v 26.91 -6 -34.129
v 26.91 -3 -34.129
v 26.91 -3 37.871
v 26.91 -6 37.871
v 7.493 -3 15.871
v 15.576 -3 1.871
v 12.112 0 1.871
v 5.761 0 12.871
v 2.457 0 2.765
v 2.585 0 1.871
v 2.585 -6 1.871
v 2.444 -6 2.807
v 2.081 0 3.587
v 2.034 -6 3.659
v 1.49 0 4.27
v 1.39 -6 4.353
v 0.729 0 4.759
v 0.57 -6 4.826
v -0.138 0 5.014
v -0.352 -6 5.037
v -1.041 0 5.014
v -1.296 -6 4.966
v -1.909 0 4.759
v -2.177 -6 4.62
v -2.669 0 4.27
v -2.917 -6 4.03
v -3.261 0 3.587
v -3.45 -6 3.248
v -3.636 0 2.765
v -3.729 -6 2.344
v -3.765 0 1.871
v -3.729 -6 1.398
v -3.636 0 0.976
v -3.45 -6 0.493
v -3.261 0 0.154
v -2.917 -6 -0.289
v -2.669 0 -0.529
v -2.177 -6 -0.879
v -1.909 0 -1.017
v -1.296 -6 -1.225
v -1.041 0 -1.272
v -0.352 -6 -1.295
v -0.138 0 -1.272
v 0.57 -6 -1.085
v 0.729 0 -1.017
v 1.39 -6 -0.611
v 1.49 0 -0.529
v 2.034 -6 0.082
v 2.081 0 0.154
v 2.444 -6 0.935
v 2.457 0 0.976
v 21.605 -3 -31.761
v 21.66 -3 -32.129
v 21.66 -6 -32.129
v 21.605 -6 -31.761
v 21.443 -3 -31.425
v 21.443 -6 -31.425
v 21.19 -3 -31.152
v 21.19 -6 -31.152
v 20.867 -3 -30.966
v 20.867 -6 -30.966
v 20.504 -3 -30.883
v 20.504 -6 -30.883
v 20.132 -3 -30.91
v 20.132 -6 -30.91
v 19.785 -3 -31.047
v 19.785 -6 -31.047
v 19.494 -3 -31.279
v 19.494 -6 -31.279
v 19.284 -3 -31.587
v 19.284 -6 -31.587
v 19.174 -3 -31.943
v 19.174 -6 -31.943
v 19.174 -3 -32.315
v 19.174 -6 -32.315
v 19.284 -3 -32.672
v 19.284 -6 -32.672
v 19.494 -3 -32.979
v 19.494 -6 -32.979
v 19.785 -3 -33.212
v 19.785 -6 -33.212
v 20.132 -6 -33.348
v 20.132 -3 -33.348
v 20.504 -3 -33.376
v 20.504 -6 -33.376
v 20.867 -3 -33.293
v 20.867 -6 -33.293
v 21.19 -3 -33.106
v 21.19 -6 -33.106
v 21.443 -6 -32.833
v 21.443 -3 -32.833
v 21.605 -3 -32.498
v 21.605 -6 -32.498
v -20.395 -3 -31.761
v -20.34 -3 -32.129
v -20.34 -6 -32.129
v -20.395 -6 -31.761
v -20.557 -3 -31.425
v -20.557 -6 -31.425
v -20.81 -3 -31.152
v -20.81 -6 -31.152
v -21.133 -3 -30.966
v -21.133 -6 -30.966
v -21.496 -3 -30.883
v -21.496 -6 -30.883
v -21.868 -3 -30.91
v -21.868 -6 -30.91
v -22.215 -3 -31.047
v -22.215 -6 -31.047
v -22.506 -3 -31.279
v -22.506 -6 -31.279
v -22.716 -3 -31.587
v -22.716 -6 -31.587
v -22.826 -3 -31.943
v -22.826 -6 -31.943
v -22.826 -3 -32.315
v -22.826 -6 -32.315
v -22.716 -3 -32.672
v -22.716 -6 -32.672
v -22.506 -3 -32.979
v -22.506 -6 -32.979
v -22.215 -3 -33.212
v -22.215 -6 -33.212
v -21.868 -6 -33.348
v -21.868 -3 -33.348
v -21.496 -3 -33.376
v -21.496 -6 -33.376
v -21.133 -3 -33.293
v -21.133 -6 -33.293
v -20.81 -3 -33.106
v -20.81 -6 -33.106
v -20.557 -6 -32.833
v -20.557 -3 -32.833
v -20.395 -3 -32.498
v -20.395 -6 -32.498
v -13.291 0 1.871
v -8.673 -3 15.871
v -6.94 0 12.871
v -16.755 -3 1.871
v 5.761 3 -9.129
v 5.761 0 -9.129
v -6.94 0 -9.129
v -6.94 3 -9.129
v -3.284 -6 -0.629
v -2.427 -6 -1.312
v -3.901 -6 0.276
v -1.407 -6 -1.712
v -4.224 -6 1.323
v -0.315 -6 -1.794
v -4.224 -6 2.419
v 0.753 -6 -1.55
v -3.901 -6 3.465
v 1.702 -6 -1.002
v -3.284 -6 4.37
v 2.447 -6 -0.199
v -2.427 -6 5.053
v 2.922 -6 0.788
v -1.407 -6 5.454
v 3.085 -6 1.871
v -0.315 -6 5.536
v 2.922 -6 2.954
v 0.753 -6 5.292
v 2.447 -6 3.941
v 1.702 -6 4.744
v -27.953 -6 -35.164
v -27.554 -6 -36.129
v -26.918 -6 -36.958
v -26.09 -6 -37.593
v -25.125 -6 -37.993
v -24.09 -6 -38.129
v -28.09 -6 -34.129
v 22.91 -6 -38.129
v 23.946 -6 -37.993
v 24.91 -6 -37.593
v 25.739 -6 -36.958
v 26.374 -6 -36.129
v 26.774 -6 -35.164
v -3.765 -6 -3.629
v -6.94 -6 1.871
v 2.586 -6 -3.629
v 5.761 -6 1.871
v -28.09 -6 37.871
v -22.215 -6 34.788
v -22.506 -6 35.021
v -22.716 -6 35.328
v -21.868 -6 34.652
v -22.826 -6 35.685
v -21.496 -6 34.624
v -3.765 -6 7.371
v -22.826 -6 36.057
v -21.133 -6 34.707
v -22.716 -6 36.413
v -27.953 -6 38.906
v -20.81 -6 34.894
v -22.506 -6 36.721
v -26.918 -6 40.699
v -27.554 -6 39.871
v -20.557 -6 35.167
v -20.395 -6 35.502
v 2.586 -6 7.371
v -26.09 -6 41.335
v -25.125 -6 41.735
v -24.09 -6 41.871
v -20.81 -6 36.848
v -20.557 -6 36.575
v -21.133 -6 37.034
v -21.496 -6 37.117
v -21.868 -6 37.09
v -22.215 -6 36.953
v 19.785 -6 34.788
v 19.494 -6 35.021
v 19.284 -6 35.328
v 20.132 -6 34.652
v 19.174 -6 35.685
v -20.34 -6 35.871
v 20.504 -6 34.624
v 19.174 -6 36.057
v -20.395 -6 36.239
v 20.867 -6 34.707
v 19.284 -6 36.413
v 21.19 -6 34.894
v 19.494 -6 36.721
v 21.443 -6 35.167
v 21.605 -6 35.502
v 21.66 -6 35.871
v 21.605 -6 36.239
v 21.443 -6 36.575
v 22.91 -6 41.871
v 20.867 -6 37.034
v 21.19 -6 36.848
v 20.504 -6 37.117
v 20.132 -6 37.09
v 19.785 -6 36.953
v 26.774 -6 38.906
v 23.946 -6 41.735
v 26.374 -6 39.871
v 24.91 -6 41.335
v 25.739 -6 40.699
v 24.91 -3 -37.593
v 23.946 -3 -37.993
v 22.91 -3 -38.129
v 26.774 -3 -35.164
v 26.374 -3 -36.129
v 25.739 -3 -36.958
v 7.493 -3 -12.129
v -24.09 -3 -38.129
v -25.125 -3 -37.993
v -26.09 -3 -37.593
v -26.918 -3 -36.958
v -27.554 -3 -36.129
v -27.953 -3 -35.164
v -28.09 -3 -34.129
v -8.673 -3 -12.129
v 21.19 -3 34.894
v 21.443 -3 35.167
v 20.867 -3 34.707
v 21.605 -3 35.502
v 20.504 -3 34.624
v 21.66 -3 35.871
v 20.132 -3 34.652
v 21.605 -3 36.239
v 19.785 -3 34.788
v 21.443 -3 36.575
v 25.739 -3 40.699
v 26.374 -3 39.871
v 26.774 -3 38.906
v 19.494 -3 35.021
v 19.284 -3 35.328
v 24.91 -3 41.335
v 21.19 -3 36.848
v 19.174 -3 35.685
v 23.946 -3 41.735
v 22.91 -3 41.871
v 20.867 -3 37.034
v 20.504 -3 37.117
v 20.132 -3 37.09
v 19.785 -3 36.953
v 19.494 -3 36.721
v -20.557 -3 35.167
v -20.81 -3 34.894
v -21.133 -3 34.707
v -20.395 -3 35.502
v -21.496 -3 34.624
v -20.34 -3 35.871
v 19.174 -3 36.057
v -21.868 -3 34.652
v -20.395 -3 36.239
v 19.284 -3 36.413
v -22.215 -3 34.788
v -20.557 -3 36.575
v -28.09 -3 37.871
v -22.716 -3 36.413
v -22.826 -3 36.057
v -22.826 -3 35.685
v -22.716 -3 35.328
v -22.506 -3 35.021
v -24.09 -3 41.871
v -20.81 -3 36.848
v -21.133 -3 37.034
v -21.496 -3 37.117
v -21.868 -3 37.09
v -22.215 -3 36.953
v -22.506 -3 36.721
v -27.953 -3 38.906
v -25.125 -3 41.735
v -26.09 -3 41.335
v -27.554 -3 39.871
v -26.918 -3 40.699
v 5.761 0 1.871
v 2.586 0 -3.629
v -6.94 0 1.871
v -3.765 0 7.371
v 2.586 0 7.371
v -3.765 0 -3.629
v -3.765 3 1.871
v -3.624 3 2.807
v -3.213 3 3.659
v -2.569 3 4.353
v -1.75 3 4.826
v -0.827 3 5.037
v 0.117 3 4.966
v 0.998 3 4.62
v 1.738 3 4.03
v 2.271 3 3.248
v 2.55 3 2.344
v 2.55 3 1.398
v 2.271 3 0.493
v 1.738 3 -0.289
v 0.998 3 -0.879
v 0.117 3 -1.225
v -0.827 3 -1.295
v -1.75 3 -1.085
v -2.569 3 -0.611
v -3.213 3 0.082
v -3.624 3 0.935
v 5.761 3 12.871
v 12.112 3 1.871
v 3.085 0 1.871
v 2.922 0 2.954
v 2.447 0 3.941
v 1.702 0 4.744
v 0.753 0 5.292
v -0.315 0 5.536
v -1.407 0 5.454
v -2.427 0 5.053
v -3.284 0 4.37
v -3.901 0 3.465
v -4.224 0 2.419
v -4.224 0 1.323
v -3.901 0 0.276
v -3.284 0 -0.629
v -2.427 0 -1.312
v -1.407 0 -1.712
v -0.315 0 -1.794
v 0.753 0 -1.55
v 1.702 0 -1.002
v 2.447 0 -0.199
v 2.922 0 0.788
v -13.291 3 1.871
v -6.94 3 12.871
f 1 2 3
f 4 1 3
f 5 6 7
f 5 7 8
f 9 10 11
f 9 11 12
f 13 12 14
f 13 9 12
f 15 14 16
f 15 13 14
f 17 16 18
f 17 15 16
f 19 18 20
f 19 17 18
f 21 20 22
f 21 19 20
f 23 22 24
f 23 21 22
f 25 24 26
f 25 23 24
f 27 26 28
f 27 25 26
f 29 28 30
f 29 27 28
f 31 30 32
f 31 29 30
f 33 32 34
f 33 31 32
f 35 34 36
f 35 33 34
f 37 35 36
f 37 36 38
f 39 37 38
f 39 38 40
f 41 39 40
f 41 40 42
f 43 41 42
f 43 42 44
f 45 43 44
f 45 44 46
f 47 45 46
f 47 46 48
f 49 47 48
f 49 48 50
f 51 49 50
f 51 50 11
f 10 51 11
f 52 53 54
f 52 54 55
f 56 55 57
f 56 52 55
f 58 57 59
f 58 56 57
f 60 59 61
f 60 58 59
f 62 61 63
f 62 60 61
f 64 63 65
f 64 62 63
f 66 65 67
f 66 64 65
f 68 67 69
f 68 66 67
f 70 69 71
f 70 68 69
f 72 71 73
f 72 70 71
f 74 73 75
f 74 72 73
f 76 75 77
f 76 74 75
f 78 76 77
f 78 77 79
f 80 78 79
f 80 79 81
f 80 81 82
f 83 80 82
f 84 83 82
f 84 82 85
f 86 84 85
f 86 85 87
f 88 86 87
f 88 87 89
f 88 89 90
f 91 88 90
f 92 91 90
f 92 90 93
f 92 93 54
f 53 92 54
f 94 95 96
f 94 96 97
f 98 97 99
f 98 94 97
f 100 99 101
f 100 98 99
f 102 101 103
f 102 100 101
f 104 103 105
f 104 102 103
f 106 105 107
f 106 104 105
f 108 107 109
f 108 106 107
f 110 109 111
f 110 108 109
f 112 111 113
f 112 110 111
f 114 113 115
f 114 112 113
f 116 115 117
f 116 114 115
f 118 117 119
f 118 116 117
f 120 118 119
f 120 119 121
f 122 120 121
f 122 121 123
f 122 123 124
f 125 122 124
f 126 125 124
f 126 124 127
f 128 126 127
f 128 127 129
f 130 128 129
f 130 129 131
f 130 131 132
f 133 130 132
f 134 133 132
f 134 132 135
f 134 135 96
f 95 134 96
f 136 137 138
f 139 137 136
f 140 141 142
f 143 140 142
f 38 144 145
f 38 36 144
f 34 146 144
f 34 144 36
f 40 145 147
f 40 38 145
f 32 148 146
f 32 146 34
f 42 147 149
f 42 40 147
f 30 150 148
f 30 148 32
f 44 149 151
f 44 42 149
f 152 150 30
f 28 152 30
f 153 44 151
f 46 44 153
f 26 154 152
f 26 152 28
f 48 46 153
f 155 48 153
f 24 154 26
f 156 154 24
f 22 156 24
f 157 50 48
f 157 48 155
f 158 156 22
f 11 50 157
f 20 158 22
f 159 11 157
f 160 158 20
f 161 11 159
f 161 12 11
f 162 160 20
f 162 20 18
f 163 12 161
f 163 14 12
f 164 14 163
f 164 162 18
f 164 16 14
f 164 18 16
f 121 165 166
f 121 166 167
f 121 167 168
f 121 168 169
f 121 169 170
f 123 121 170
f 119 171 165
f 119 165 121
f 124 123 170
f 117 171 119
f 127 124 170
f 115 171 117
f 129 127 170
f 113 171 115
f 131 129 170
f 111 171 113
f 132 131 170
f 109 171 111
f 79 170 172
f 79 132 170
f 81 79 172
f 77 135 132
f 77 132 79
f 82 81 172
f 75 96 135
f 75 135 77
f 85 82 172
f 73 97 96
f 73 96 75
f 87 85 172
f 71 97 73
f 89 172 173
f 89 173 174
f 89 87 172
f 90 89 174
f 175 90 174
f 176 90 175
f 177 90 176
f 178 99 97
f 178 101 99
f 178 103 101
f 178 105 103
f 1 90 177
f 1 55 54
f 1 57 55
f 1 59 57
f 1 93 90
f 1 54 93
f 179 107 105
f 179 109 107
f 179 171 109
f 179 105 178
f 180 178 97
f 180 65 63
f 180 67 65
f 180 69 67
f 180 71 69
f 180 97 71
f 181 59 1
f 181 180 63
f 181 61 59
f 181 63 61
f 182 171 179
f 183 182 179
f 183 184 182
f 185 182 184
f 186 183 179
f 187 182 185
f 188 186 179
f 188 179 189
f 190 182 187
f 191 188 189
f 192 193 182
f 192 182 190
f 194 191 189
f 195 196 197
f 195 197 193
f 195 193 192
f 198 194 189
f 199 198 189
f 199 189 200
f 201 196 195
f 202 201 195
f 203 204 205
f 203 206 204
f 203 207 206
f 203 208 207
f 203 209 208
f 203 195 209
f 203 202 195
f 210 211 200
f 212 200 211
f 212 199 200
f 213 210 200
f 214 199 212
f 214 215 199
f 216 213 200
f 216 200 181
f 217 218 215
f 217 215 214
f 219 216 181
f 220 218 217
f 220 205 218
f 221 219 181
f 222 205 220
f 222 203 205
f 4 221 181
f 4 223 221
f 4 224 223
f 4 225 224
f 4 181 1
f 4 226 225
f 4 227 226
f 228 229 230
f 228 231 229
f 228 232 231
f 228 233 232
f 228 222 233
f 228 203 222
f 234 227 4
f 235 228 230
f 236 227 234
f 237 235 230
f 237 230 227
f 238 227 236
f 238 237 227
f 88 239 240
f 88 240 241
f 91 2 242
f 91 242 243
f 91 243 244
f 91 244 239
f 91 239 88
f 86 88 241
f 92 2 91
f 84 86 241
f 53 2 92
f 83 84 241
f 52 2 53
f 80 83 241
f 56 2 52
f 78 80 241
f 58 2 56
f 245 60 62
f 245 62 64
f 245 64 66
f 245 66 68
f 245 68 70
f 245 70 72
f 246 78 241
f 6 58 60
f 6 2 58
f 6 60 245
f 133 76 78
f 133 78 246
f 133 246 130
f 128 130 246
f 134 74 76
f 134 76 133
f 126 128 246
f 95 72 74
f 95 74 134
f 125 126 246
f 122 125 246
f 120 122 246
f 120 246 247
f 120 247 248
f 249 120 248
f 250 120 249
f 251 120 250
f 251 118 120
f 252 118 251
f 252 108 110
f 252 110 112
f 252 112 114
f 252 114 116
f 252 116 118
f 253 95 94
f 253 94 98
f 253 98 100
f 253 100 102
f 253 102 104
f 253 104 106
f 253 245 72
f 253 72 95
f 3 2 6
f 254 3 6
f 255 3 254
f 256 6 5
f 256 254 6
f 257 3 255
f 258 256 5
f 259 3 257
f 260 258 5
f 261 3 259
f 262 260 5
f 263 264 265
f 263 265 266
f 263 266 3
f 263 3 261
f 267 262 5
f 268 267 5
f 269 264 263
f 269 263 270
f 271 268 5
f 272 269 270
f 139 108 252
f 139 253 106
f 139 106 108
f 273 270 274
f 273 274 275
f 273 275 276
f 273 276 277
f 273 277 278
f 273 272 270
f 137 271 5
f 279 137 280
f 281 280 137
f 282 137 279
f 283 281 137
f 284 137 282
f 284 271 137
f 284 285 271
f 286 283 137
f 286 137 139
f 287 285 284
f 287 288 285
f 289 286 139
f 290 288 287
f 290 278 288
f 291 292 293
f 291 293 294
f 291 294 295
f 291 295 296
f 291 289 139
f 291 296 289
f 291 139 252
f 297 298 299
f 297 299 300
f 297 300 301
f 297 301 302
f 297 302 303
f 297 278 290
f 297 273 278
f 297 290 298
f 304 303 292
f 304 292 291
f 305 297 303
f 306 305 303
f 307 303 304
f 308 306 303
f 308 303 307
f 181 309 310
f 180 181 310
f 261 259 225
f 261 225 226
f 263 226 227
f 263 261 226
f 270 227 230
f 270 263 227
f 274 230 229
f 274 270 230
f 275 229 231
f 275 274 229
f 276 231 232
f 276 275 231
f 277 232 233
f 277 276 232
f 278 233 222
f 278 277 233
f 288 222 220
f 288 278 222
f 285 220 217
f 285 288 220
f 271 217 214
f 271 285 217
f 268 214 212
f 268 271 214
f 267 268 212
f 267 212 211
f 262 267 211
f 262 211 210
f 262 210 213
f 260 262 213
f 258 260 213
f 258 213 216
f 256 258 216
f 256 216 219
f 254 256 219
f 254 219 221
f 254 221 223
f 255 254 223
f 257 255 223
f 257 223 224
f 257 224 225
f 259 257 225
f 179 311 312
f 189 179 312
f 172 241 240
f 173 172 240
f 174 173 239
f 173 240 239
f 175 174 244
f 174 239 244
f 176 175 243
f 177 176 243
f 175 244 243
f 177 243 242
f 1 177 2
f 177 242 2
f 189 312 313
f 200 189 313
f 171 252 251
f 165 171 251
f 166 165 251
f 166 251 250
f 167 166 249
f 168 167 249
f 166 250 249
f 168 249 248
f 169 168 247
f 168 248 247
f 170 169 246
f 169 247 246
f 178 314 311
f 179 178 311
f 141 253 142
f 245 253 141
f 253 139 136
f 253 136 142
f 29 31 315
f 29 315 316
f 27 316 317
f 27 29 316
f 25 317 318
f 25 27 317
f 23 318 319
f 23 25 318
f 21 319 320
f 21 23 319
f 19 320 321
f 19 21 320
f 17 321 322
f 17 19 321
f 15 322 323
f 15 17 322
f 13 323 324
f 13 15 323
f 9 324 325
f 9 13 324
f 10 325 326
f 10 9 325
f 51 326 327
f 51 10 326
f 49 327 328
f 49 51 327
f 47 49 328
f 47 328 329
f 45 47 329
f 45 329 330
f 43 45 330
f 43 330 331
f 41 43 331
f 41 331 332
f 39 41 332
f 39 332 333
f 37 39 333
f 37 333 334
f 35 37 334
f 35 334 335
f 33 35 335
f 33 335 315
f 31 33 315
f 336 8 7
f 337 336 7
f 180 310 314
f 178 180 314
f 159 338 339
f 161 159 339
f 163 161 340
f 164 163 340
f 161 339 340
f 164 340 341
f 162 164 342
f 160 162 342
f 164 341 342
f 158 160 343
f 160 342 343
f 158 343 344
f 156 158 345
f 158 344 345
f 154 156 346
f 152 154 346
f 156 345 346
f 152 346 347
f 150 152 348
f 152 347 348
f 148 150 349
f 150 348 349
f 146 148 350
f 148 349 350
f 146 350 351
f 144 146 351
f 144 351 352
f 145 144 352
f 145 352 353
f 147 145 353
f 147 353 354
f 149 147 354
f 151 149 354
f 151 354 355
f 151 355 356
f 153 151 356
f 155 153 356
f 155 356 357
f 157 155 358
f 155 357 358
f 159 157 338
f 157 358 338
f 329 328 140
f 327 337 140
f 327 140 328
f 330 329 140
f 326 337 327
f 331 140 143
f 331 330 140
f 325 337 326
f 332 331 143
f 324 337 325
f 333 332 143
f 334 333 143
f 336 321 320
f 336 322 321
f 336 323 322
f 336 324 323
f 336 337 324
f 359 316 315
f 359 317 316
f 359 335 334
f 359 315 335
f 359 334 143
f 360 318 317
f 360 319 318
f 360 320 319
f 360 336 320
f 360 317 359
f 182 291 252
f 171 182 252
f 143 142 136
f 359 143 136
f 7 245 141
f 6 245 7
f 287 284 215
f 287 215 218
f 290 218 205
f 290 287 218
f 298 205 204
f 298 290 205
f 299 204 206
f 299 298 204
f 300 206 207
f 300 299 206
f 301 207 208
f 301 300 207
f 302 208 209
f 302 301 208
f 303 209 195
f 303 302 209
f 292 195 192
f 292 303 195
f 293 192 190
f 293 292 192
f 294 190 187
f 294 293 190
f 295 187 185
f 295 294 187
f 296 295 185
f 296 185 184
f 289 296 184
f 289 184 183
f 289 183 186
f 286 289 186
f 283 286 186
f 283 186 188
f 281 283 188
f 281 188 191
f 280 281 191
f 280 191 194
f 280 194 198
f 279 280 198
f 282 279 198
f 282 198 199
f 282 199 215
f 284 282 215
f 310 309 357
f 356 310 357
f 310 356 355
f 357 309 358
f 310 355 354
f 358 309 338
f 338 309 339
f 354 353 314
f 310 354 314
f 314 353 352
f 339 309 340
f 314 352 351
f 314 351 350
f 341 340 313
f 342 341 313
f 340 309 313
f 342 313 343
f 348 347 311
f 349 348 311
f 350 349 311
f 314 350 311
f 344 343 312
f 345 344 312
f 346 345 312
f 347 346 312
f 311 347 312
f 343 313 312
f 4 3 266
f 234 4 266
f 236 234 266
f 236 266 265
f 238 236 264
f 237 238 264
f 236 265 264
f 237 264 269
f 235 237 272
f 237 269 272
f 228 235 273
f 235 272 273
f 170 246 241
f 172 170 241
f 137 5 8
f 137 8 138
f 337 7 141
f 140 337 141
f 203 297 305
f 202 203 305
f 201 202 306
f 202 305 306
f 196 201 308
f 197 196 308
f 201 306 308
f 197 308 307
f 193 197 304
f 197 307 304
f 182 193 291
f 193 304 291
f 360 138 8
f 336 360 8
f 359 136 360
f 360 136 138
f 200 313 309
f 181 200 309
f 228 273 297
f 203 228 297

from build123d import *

# Parameters (mm, degrees)
F0_R     = 1.25
F1_DEPTH = 6
F2_R     = 1.25
F3_DEPTH = 3
F4_SIZE  = 2.99999
F5_R     = 3.175
F6_DEPTH = 3
F7_R     = 3.675
F7_R_2   = 3.175
F8_DEPTH = 6


# Not quite as in the source:
# - a fillet or chamfer is up to 0.001 mm smaller than in the source, because OpenCascade refuses the exact size


with BuildPart() as f1:
    # F0 (on Front) → F1 (new body)
    with BuildSketch(Plane.XZ):
        with BuildLine():
            Line((22.9103805721, 41.8708454072), (-24.0896194279, 41.8708454072))
            ThreePointArc((-24.0896194279, 41.8708454072), (-26.9180465527, 40.699272532), (-28.0896194279, 37.8708454072))
            Line((-28.0896194279, 37.8708454072), (-28.0896194279, -34.1291545928))
            ThreePointArc((-28.0896194279, -34.1291545928), (-26.9180465527, -36.9575817175), (-24.0896194279, -38.1291545928))
            Line((-24.0896194279, -38.1291545928), (22.9103805721, -38.1291545928))
            ThreePointArc((22.9103805721, -38.1291545928), (25.7388076968, -36.9575817175), (26.9103805721, -34.1291545928))
            Line((26.9103805721, -34.1291545928), (26.9103805721, 37.8708454072))
            ThreePointArc((26.9103805721, 37.8708454072), (25.7388076968, 40.699272532), (22.9103805721, 41.8708454072))
        make_face()
        with Locations((-21.5896194279, -32.1291545928)):
            Circle(F0_R, mode=Mode.SUBTRACT)
        with Locations((20.4103805721, -32.1291545928)):
            Circle(F0_R, mode=Mode.SUBTRACT)
        Polygon((5.7612335332, 1.8708454072), (2.5858070526, -3.6291545928), (-3.7650459085, -3.6291545928), (-6.940472389, 1.8708454072), (-3.7650459085, 7.3708454072), (2.5858070526, 7.3708454072), align=None, mode=Mode.SUBTRACT)
        with Locations((-21.5896194279, 35.8708454072)):
            Circle(F0_R, mode=Mode.SUBTRACT)
        with Locations((20.4103805721, 35.8708454072)):
            Circle(F0_R, mode=Mode.SUBTRACT)
    extrude(amount=F1_DEPTH)

    # F2 (on face) → F3 (cut)
    with BuildSketch(Plane(origin=(0, 0, 0), x_dir=(-1, 0, 0), z_dir=(0, 1, 0))):
        with BuildLine():
            ThreePointArc((28.0896194279, 37.8708454072), (26.9180465527, 40.699272532), (24.0896194279, 41.8708454072))
            Line((24.0896194279, 41.8708454072), (-22.9103805721, 41.8708454072))
            ThreePointArc((-22.9103805721, 41.8708454072), (-25.7388076968, 40.699272532), (-26.9103805721, 37.8708454072))
            Line((-26.9103805721, 37.8708454072), (-26.9103805721, -34.1291545928))
            ThreePointArc((-26.9103805721, -34.1291545928), (-25.7388076968, -36.9575817175), (-22.9103805721, -38.1291545928))
            Line((-22.9103805721, -38.1291545928), (24.0896194279, -38.1291545928))
            ThreePointArc((24.0896194279, -38.1291545928), (26.9180465527, -36.9575817175), (28.0896194279, -34.1291545928))
            Line((28.0896194279, -34.1291545928), (28.0896194279, 37.8708454072))
        make_face()
        with Locations((-20.4103805721, -32.1291545928)):
            Circle(F2_R, mode=Mode.SUBTRACT)
        with Locations((21.5896194279, -32.1291545928)):
            Circle(F2_R, mode=Mode.SUBTRACT)
        Polygon((13.2913253501, 1.8708454072), (6.940472389, -9.1291545928), (-5.7612335332, -9.1291545928), (-12.1120864943, 1.8708454072), (-5.7612335332, 12.8708454072), (6.940472389, 12.8708454072), align=None, mode=Mode.SUBTRACT)
        with Locations((-20.4103805721, 35.8708454072)):
            Circle(F2_R, mode=Mode.SUBTRACT)
        with Locations((21.5896194279, 35.8708454072)):
            Circle(F2_R, mode=Mode.SUBTRACT)
    extrude(amount=-F3_DEPTH, mode=Mode.SUBTRACT)

    # F4 (size 3 in the source; OpenCascade refuses exactly that, so slightly less here)
    f4_edges = [f1.edges().sort_by_distance(p)[0] for p in [
        (8.93666, -3, 7.370845),
        (8.93666, -3, -3.629155),
        (-0.589619, -3, -9.129155),
        (-10.115899, -3, -3.629155),
        (-10.115899, -3, 7.370845),
        (-0.589619, -3, 12.870845),
    ]]
    chamfer(f4_edges, length=F4_SIZE)

    # F5 (on face) → F6 (join)
    with BuildSketch(Plane(origin=(0, 0, 0), x_dir=(-1, 0, 0), z_dir=(0, 1, 0))):
        Polygon((6.940472389, -9.1291545928), (13.2913253501, 1.8708454072), (6.940472389, 12.8708454072), (-5.7612335332, 12.8708454072), (-12.1120864943, 1.8708454072), (-5.7612335332, -9.1291545928), align=None)
        Polygon((3.7650459085, -3.6291545928), (-2.5858070526, -3.6291545928), (-5.7612335332, 1.8708454072), (-2.5858070526, 7.3708454072), (3.7650459085, 7.3708454072), (6.940472389, 1.8708454072), align=None, mode=Mode.SUBTRACT)
        Polygon((-5.7612335332, 1.8708454072), (-2.5858070526, -3.6291545928), (3.7650459085, -3.6291545928), (6.940472389, 1.8708454072), (3.7650459085, 7.3708454072), (-2.5858070526, 7.3708454072), align=None)
        with Locations((0.5896194279, 1.8708454072)):
            Circle(F5_R, mode=Mode.SUBTRACT)
    extrude(amount=F6_DEPTH)

    # F7 (on face) → F8 (join, through all)
    with BuildSketch(Plane.XZ):
        with Locations((-0.5896194279, 1.8708454072)):
            Circle(F7_R)
        with Locations((-0.5896194279, 1.8708454072)):
            Circle(F7_R_2, mode=Mode.SUBTRACT)
    extrude(amount=F8_DEPTH)


solid = f1.part
